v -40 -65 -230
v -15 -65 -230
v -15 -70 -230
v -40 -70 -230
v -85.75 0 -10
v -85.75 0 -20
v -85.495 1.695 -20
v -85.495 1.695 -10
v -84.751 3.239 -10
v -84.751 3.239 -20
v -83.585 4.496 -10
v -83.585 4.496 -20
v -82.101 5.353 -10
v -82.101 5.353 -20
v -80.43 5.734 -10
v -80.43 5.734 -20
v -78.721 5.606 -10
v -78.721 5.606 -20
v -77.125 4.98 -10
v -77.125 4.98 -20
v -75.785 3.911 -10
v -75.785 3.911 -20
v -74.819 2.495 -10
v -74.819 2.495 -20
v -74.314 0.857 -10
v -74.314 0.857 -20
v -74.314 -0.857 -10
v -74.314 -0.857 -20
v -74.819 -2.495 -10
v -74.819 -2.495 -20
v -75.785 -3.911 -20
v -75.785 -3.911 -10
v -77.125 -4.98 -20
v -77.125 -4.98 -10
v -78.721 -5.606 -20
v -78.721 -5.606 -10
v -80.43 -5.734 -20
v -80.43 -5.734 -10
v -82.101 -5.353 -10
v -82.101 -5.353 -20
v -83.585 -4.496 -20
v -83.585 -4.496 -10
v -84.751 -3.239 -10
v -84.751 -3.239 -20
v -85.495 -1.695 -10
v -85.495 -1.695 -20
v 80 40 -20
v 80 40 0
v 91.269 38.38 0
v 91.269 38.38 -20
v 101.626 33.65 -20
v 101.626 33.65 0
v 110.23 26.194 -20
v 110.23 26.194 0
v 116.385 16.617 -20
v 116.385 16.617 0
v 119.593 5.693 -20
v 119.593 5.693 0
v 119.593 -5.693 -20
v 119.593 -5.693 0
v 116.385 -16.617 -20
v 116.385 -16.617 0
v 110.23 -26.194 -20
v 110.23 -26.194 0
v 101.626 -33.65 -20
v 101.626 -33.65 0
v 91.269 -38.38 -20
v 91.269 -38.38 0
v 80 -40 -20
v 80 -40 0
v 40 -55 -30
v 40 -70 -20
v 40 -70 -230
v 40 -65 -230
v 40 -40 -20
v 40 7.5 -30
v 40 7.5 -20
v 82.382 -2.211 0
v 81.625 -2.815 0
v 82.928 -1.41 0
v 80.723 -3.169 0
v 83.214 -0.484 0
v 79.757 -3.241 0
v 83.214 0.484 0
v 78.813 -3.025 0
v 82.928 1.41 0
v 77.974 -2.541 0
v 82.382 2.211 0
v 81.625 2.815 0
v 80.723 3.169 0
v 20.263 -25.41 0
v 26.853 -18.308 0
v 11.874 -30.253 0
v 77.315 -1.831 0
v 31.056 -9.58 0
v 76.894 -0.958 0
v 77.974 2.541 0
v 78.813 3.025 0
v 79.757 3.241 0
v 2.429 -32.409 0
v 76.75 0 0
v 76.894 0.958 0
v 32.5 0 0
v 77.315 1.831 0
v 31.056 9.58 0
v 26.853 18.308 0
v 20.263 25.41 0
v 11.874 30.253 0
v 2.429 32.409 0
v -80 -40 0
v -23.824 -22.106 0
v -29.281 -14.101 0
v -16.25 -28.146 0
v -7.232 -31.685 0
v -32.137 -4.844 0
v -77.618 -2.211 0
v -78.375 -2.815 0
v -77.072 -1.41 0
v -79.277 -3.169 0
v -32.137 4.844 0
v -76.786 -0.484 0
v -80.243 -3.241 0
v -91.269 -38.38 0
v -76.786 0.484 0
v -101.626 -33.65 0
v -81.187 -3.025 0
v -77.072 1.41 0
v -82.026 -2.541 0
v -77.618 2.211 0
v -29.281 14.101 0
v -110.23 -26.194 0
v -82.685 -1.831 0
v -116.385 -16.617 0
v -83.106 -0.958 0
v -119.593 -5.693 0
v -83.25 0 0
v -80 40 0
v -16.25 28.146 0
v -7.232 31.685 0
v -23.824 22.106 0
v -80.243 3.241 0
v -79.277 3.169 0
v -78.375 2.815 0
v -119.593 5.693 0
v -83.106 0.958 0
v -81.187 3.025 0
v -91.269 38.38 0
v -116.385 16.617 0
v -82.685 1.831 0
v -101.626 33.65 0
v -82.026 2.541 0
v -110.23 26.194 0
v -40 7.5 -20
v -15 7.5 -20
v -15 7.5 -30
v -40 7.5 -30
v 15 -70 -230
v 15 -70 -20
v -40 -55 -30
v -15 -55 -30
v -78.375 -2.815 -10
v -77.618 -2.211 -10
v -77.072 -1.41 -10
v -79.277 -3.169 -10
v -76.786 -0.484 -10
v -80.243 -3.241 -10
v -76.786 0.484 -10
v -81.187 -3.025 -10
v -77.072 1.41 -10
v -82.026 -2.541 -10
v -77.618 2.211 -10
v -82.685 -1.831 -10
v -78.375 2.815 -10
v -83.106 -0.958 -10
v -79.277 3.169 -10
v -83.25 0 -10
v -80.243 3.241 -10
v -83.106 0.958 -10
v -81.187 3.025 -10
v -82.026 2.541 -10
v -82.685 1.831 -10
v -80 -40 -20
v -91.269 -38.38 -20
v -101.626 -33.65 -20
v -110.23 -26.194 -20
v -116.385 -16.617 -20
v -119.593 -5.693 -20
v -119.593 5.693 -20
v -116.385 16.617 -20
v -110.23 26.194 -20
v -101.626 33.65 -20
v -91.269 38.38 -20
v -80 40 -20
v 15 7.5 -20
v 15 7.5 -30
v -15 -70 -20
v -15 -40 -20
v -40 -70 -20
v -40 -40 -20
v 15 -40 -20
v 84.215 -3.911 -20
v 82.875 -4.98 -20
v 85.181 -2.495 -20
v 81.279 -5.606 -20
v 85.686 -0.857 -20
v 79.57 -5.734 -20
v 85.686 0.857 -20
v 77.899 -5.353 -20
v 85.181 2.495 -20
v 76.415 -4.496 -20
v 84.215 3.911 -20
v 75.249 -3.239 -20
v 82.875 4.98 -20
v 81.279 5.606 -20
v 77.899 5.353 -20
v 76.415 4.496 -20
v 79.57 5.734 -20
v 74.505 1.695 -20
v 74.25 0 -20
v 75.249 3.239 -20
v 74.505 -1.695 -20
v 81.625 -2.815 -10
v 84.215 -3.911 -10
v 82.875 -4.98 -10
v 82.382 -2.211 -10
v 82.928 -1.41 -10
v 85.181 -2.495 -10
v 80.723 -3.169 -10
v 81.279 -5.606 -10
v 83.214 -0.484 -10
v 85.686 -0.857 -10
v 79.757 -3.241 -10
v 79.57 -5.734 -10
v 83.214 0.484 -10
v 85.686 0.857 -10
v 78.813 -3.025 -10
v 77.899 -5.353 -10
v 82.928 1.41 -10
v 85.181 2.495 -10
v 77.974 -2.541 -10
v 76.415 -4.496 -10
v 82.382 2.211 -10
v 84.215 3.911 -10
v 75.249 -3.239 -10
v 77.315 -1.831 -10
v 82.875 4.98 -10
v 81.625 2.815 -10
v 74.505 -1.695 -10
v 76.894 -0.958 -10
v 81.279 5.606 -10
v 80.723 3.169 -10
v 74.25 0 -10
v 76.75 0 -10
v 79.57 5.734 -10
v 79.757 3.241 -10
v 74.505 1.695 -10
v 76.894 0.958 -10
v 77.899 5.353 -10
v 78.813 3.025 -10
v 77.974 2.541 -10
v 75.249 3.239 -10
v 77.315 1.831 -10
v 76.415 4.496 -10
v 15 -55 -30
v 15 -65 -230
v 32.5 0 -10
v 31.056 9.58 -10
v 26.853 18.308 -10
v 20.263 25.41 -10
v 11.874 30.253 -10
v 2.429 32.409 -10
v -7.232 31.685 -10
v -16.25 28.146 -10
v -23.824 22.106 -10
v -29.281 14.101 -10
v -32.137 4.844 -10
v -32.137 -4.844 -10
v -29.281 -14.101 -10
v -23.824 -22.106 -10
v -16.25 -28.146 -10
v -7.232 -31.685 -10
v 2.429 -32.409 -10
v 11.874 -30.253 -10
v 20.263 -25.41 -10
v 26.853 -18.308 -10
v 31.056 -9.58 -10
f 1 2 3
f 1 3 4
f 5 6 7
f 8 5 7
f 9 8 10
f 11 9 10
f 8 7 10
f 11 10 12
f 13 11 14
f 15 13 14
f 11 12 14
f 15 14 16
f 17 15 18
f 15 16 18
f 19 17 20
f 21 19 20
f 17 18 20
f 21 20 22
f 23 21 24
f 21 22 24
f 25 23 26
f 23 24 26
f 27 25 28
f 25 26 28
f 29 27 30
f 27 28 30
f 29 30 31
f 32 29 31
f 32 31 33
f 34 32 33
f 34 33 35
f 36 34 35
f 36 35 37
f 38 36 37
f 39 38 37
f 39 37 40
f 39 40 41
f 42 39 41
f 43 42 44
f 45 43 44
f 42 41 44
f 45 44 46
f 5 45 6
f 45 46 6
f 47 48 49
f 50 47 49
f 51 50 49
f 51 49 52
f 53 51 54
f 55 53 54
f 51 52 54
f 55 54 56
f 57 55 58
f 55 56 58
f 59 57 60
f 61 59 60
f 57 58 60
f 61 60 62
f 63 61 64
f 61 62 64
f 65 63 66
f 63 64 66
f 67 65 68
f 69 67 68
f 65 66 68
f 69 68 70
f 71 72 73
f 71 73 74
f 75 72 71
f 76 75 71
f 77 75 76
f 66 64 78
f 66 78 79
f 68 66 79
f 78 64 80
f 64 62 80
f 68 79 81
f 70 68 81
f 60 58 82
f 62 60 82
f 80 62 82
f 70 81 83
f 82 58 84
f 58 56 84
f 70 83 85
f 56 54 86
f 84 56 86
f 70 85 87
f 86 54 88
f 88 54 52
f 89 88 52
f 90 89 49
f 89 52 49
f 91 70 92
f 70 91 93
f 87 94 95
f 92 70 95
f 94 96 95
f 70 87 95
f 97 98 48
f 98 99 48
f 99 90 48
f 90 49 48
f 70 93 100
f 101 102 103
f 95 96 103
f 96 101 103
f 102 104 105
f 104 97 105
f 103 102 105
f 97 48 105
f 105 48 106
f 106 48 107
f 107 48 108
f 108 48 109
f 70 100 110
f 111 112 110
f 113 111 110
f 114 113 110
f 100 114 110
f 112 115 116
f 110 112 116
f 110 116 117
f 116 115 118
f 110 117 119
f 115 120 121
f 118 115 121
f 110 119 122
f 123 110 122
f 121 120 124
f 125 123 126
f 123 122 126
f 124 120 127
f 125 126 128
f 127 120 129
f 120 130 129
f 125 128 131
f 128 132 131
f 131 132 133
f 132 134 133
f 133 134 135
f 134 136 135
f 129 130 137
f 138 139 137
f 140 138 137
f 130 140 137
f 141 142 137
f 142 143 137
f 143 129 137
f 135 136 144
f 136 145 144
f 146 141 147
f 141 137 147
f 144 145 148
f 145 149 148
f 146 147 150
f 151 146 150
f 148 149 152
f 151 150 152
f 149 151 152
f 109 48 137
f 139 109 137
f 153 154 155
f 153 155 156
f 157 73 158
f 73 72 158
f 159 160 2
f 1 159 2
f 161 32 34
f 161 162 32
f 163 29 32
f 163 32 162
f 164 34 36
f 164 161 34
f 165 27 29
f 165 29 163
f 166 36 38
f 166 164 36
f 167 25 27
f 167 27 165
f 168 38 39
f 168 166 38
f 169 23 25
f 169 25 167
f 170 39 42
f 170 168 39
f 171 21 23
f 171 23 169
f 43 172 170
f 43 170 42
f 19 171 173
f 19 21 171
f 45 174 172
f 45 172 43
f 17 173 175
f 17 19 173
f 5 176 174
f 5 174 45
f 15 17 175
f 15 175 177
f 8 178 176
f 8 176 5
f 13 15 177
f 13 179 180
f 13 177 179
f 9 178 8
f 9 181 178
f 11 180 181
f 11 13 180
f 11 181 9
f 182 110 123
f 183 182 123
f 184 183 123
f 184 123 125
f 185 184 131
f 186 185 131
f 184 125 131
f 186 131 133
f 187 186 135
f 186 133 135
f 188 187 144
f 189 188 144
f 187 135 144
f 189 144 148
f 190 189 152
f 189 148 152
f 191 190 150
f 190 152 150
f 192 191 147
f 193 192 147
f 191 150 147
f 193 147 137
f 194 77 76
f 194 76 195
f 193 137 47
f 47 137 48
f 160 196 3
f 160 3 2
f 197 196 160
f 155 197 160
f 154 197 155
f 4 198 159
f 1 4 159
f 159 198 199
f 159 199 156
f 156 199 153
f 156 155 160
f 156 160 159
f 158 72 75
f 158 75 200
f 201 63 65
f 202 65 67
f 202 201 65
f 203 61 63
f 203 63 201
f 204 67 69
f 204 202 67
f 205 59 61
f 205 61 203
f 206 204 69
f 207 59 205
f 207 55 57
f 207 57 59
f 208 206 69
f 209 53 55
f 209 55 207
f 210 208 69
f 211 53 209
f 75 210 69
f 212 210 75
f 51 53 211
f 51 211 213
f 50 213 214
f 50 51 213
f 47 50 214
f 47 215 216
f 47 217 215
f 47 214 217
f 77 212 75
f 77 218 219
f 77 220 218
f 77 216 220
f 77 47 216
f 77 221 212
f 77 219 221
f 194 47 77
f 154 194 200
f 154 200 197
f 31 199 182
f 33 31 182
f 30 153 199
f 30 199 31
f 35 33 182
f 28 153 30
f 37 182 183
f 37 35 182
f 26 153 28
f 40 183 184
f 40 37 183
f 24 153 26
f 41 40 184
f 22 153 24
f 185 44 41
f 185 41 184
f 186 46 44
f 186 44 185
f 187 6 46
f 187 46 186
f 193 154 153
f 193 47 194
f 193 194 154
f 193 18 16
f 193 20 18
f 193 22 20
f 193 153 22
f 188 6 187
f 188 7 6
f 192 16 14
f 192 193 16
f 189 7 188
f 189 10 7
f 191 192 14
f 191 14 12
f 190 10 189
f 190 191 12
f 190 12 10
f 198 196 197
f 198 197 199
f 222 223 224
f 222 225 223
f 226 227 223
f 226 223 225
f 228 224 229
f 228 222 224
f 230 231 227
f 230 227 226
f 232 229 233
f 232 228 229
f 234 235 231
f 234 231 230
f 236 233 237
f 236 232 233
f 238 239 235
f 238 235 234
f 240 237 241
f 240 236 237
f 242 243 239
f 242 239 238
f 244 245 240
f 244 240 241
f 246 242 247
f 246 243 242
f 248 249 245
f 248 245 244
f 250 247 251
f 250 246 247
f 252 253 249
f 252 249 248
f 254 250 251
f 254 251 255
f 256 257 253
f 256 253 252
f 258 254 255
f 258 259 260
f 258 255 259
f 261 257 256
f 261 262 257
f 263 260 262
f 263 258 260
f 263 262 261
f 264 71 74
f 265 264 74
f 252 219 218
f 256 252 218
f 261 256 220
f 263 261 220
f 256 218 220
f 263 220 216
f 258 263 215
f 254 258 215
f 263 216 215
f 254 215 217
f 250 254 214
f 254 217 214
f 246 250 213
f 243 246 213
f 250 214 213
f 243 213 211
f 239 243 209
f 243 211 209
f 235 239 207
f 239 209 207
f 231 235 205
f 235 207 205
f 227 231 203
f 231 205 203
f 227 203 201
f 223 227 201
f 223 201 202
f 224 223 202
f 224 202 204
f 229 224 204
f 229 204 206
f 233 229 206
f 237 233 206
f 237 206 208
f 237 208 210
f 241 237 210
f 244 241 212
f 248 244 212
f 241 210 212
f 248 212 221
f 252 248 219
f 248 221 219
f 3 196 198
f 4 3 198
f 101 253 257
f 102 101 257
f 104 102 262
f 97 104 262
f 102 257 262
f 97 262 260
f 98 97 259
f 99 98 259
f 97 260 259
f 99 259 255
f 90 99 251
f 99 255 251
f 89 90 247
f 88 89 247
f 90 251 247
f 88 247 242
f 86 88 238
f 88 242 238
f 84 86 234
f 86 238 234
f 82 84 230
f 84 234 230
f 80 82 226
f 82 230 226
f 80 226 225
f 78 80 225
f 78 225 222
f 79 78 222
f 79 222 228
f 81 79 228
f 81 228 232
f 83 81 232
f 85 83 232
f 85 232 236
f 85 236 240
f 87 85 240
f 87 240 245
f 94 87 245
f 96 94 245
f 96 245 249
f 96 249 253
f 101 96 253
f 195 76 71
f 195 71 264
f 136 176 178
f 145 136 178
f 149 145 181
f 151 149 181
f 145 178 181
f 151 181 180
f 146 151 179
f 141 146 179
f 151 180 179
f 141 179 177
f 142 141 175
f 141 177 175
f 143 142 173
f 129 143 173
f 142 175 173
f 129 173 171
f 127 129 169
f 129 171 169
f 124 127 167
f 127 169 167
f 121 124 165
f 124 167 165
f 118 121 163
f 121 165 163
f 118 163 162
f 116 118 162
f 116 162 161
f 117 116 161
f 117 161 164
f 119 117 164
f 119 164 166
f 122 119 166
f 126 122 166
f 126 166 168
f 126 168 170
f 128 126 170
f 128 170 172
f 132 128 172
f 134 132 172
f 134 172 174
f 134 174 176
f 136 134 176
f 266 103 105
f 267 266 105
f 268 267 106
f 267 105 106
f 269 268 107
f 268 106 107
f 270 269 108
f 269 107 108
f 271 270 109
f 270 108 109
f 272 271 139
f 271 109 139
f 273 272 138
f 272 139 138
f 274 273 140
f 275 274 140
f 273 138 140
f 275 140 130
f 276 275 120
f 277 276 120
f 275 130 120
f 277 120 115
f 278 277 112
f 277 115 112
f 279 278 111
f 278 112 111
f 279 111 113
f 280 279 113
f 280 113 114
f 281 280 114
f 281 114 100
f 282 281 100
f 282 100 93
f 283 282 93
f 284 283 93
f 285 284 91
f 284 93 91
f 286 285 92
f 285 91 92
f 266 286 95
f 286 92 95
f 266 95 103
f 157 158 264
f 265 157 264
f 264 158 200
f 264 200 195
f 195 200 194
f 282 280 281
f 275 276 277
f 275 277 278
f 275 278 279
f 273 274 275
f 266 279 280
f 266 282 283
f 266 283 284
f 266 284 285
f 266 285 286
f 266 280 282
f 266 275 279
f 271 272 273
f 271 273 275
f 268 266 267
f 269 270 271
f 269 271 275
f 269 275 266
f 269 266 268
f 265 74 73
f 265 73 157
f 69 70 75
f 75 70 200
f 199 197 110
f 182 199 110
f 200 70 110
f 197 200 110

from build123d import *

# Parameters (mm, degrees)
EXTRUDE_1_DEPTH     = 20
SKETCH_4_R          = 32.5
CUT_EXTRUDE_4_DEPTH = 10
SKETCH_10_W         = 25
SKETCH_10_H         = 77.5
EXTRUDE_5_DEPTH     = 10
SKETCH_14_W         = 25
SKETCH_14_H         = 15
EXTRUDE_6_DEPTH     = 200
CUT_EXTRUDE_5_DEPTH = 161
SKETCH_16_R         = 3.25
CUT_EXTRUDE_6_DEPTH = 21
SKETCH_17_R         = 5.75
CUT_EXTRUDE_7_DEPTH = 10


with BuildPart() as part:
    # 스케치3 → 보스-돌출1 (new body)
    with BuildSketch(Plane.XY):
        with BuildLine():
            Line((-80, 40), (80, 40))
            ThreePointArc((80, 40), (120, 0), (80, -40))
            Line((80, -40), (-80, -40))
            ThreePointArc((-80, -40), (-120, 0), (-80, 40))
        make_face()
    extrude(amount=-EXTRUDE_1_DEPTH)

    # 스케치4 → 컷-돌출4 (cut)
    with BuildSketch(Plane.XY):
        Circle(SKETCH_4_R)
    extrude(amount=-CUT_EXTRUDE_4_DEPTH, mode=Mode.SUBTRACT)

    # 스케치10 → 보스-돌출5 (add)
    with BuildSketch(Plane(origin=(0, 0, -20), x_dir=(-1, 0, 0), z_dir=(0, 0, -1))):
        with Locations((-27.5, -31.25)):
            Rectangle(SKETCH_10_W, SKETCH_10_H)
        with Locations((27.5, -31.25)):
            Rectangle(SKETCH_10_W, SKETCH_10_H)
    extrude(amount=EXTRUDE_5_DEPTH)

    # 스케치14 → 보스-돌출6 (add)
    with BuildSketch(Plane(origin=(0, 0, -30), x_dir=(-1, 0, 0), z_dir=(0, 0, -1))):
        with Locations((-27.5, -62.5)):
            Rectangle(SKETCH_14_W, SKETCH_14_H)
        with Locations((27.5, -62.5)):
            Rectangle(SKETCH_14_W, SKETCH_14_H)
    extrude(amount=EXTRUDE_6_DEPTH)

    # 스케치15 → 컷-돌출5 (cut, through all)
    with BuildSketch(Plane(origin=(40, 0, 0), x_dir=(0, 0, -1), z_dir=(1, 0, 0))):
        Polygon((30, -55), (230, -65), (230, -55), align=None)
    extrude(amount=-CUT_EXTRUDE_5_DEPTH, mode=Mode.SUBTRACT)

    # 스케치16 → 컷-돌출6 (cut, through all)
    with BuildSketch(Plane(origin=(0, 0, -20), x_dir=(-1, 0, 0), z_dir=(0, 0, -1))):
        with Locations((-80, 0)):
            Circle(SKETCH_16_R)
        with Locations((80, 0)):
            Circle(SKETCH_16_R)
    extrude(amount=-CUT_EXTRUDE_6_DEPTH, mode=Mode.SUBTRACT)

    # 스케치17 → 컷-돌출7 (cut)
    with BuildSketch(Plane(origin=(0, 0, -20), x_dir=(-1, 0, 0), z_dir=(0, 0, -1))):
        with Locations((-80, 0)):
            Circle(SKETCH_17_R)
        with Locations((80, 0)):
            Circle(SKETCH_17_R)
    extrude(amount=-CUT_EXTRUDE_7_DEPTH, mode=Mode.SUBTRACT)


solid = part.part
